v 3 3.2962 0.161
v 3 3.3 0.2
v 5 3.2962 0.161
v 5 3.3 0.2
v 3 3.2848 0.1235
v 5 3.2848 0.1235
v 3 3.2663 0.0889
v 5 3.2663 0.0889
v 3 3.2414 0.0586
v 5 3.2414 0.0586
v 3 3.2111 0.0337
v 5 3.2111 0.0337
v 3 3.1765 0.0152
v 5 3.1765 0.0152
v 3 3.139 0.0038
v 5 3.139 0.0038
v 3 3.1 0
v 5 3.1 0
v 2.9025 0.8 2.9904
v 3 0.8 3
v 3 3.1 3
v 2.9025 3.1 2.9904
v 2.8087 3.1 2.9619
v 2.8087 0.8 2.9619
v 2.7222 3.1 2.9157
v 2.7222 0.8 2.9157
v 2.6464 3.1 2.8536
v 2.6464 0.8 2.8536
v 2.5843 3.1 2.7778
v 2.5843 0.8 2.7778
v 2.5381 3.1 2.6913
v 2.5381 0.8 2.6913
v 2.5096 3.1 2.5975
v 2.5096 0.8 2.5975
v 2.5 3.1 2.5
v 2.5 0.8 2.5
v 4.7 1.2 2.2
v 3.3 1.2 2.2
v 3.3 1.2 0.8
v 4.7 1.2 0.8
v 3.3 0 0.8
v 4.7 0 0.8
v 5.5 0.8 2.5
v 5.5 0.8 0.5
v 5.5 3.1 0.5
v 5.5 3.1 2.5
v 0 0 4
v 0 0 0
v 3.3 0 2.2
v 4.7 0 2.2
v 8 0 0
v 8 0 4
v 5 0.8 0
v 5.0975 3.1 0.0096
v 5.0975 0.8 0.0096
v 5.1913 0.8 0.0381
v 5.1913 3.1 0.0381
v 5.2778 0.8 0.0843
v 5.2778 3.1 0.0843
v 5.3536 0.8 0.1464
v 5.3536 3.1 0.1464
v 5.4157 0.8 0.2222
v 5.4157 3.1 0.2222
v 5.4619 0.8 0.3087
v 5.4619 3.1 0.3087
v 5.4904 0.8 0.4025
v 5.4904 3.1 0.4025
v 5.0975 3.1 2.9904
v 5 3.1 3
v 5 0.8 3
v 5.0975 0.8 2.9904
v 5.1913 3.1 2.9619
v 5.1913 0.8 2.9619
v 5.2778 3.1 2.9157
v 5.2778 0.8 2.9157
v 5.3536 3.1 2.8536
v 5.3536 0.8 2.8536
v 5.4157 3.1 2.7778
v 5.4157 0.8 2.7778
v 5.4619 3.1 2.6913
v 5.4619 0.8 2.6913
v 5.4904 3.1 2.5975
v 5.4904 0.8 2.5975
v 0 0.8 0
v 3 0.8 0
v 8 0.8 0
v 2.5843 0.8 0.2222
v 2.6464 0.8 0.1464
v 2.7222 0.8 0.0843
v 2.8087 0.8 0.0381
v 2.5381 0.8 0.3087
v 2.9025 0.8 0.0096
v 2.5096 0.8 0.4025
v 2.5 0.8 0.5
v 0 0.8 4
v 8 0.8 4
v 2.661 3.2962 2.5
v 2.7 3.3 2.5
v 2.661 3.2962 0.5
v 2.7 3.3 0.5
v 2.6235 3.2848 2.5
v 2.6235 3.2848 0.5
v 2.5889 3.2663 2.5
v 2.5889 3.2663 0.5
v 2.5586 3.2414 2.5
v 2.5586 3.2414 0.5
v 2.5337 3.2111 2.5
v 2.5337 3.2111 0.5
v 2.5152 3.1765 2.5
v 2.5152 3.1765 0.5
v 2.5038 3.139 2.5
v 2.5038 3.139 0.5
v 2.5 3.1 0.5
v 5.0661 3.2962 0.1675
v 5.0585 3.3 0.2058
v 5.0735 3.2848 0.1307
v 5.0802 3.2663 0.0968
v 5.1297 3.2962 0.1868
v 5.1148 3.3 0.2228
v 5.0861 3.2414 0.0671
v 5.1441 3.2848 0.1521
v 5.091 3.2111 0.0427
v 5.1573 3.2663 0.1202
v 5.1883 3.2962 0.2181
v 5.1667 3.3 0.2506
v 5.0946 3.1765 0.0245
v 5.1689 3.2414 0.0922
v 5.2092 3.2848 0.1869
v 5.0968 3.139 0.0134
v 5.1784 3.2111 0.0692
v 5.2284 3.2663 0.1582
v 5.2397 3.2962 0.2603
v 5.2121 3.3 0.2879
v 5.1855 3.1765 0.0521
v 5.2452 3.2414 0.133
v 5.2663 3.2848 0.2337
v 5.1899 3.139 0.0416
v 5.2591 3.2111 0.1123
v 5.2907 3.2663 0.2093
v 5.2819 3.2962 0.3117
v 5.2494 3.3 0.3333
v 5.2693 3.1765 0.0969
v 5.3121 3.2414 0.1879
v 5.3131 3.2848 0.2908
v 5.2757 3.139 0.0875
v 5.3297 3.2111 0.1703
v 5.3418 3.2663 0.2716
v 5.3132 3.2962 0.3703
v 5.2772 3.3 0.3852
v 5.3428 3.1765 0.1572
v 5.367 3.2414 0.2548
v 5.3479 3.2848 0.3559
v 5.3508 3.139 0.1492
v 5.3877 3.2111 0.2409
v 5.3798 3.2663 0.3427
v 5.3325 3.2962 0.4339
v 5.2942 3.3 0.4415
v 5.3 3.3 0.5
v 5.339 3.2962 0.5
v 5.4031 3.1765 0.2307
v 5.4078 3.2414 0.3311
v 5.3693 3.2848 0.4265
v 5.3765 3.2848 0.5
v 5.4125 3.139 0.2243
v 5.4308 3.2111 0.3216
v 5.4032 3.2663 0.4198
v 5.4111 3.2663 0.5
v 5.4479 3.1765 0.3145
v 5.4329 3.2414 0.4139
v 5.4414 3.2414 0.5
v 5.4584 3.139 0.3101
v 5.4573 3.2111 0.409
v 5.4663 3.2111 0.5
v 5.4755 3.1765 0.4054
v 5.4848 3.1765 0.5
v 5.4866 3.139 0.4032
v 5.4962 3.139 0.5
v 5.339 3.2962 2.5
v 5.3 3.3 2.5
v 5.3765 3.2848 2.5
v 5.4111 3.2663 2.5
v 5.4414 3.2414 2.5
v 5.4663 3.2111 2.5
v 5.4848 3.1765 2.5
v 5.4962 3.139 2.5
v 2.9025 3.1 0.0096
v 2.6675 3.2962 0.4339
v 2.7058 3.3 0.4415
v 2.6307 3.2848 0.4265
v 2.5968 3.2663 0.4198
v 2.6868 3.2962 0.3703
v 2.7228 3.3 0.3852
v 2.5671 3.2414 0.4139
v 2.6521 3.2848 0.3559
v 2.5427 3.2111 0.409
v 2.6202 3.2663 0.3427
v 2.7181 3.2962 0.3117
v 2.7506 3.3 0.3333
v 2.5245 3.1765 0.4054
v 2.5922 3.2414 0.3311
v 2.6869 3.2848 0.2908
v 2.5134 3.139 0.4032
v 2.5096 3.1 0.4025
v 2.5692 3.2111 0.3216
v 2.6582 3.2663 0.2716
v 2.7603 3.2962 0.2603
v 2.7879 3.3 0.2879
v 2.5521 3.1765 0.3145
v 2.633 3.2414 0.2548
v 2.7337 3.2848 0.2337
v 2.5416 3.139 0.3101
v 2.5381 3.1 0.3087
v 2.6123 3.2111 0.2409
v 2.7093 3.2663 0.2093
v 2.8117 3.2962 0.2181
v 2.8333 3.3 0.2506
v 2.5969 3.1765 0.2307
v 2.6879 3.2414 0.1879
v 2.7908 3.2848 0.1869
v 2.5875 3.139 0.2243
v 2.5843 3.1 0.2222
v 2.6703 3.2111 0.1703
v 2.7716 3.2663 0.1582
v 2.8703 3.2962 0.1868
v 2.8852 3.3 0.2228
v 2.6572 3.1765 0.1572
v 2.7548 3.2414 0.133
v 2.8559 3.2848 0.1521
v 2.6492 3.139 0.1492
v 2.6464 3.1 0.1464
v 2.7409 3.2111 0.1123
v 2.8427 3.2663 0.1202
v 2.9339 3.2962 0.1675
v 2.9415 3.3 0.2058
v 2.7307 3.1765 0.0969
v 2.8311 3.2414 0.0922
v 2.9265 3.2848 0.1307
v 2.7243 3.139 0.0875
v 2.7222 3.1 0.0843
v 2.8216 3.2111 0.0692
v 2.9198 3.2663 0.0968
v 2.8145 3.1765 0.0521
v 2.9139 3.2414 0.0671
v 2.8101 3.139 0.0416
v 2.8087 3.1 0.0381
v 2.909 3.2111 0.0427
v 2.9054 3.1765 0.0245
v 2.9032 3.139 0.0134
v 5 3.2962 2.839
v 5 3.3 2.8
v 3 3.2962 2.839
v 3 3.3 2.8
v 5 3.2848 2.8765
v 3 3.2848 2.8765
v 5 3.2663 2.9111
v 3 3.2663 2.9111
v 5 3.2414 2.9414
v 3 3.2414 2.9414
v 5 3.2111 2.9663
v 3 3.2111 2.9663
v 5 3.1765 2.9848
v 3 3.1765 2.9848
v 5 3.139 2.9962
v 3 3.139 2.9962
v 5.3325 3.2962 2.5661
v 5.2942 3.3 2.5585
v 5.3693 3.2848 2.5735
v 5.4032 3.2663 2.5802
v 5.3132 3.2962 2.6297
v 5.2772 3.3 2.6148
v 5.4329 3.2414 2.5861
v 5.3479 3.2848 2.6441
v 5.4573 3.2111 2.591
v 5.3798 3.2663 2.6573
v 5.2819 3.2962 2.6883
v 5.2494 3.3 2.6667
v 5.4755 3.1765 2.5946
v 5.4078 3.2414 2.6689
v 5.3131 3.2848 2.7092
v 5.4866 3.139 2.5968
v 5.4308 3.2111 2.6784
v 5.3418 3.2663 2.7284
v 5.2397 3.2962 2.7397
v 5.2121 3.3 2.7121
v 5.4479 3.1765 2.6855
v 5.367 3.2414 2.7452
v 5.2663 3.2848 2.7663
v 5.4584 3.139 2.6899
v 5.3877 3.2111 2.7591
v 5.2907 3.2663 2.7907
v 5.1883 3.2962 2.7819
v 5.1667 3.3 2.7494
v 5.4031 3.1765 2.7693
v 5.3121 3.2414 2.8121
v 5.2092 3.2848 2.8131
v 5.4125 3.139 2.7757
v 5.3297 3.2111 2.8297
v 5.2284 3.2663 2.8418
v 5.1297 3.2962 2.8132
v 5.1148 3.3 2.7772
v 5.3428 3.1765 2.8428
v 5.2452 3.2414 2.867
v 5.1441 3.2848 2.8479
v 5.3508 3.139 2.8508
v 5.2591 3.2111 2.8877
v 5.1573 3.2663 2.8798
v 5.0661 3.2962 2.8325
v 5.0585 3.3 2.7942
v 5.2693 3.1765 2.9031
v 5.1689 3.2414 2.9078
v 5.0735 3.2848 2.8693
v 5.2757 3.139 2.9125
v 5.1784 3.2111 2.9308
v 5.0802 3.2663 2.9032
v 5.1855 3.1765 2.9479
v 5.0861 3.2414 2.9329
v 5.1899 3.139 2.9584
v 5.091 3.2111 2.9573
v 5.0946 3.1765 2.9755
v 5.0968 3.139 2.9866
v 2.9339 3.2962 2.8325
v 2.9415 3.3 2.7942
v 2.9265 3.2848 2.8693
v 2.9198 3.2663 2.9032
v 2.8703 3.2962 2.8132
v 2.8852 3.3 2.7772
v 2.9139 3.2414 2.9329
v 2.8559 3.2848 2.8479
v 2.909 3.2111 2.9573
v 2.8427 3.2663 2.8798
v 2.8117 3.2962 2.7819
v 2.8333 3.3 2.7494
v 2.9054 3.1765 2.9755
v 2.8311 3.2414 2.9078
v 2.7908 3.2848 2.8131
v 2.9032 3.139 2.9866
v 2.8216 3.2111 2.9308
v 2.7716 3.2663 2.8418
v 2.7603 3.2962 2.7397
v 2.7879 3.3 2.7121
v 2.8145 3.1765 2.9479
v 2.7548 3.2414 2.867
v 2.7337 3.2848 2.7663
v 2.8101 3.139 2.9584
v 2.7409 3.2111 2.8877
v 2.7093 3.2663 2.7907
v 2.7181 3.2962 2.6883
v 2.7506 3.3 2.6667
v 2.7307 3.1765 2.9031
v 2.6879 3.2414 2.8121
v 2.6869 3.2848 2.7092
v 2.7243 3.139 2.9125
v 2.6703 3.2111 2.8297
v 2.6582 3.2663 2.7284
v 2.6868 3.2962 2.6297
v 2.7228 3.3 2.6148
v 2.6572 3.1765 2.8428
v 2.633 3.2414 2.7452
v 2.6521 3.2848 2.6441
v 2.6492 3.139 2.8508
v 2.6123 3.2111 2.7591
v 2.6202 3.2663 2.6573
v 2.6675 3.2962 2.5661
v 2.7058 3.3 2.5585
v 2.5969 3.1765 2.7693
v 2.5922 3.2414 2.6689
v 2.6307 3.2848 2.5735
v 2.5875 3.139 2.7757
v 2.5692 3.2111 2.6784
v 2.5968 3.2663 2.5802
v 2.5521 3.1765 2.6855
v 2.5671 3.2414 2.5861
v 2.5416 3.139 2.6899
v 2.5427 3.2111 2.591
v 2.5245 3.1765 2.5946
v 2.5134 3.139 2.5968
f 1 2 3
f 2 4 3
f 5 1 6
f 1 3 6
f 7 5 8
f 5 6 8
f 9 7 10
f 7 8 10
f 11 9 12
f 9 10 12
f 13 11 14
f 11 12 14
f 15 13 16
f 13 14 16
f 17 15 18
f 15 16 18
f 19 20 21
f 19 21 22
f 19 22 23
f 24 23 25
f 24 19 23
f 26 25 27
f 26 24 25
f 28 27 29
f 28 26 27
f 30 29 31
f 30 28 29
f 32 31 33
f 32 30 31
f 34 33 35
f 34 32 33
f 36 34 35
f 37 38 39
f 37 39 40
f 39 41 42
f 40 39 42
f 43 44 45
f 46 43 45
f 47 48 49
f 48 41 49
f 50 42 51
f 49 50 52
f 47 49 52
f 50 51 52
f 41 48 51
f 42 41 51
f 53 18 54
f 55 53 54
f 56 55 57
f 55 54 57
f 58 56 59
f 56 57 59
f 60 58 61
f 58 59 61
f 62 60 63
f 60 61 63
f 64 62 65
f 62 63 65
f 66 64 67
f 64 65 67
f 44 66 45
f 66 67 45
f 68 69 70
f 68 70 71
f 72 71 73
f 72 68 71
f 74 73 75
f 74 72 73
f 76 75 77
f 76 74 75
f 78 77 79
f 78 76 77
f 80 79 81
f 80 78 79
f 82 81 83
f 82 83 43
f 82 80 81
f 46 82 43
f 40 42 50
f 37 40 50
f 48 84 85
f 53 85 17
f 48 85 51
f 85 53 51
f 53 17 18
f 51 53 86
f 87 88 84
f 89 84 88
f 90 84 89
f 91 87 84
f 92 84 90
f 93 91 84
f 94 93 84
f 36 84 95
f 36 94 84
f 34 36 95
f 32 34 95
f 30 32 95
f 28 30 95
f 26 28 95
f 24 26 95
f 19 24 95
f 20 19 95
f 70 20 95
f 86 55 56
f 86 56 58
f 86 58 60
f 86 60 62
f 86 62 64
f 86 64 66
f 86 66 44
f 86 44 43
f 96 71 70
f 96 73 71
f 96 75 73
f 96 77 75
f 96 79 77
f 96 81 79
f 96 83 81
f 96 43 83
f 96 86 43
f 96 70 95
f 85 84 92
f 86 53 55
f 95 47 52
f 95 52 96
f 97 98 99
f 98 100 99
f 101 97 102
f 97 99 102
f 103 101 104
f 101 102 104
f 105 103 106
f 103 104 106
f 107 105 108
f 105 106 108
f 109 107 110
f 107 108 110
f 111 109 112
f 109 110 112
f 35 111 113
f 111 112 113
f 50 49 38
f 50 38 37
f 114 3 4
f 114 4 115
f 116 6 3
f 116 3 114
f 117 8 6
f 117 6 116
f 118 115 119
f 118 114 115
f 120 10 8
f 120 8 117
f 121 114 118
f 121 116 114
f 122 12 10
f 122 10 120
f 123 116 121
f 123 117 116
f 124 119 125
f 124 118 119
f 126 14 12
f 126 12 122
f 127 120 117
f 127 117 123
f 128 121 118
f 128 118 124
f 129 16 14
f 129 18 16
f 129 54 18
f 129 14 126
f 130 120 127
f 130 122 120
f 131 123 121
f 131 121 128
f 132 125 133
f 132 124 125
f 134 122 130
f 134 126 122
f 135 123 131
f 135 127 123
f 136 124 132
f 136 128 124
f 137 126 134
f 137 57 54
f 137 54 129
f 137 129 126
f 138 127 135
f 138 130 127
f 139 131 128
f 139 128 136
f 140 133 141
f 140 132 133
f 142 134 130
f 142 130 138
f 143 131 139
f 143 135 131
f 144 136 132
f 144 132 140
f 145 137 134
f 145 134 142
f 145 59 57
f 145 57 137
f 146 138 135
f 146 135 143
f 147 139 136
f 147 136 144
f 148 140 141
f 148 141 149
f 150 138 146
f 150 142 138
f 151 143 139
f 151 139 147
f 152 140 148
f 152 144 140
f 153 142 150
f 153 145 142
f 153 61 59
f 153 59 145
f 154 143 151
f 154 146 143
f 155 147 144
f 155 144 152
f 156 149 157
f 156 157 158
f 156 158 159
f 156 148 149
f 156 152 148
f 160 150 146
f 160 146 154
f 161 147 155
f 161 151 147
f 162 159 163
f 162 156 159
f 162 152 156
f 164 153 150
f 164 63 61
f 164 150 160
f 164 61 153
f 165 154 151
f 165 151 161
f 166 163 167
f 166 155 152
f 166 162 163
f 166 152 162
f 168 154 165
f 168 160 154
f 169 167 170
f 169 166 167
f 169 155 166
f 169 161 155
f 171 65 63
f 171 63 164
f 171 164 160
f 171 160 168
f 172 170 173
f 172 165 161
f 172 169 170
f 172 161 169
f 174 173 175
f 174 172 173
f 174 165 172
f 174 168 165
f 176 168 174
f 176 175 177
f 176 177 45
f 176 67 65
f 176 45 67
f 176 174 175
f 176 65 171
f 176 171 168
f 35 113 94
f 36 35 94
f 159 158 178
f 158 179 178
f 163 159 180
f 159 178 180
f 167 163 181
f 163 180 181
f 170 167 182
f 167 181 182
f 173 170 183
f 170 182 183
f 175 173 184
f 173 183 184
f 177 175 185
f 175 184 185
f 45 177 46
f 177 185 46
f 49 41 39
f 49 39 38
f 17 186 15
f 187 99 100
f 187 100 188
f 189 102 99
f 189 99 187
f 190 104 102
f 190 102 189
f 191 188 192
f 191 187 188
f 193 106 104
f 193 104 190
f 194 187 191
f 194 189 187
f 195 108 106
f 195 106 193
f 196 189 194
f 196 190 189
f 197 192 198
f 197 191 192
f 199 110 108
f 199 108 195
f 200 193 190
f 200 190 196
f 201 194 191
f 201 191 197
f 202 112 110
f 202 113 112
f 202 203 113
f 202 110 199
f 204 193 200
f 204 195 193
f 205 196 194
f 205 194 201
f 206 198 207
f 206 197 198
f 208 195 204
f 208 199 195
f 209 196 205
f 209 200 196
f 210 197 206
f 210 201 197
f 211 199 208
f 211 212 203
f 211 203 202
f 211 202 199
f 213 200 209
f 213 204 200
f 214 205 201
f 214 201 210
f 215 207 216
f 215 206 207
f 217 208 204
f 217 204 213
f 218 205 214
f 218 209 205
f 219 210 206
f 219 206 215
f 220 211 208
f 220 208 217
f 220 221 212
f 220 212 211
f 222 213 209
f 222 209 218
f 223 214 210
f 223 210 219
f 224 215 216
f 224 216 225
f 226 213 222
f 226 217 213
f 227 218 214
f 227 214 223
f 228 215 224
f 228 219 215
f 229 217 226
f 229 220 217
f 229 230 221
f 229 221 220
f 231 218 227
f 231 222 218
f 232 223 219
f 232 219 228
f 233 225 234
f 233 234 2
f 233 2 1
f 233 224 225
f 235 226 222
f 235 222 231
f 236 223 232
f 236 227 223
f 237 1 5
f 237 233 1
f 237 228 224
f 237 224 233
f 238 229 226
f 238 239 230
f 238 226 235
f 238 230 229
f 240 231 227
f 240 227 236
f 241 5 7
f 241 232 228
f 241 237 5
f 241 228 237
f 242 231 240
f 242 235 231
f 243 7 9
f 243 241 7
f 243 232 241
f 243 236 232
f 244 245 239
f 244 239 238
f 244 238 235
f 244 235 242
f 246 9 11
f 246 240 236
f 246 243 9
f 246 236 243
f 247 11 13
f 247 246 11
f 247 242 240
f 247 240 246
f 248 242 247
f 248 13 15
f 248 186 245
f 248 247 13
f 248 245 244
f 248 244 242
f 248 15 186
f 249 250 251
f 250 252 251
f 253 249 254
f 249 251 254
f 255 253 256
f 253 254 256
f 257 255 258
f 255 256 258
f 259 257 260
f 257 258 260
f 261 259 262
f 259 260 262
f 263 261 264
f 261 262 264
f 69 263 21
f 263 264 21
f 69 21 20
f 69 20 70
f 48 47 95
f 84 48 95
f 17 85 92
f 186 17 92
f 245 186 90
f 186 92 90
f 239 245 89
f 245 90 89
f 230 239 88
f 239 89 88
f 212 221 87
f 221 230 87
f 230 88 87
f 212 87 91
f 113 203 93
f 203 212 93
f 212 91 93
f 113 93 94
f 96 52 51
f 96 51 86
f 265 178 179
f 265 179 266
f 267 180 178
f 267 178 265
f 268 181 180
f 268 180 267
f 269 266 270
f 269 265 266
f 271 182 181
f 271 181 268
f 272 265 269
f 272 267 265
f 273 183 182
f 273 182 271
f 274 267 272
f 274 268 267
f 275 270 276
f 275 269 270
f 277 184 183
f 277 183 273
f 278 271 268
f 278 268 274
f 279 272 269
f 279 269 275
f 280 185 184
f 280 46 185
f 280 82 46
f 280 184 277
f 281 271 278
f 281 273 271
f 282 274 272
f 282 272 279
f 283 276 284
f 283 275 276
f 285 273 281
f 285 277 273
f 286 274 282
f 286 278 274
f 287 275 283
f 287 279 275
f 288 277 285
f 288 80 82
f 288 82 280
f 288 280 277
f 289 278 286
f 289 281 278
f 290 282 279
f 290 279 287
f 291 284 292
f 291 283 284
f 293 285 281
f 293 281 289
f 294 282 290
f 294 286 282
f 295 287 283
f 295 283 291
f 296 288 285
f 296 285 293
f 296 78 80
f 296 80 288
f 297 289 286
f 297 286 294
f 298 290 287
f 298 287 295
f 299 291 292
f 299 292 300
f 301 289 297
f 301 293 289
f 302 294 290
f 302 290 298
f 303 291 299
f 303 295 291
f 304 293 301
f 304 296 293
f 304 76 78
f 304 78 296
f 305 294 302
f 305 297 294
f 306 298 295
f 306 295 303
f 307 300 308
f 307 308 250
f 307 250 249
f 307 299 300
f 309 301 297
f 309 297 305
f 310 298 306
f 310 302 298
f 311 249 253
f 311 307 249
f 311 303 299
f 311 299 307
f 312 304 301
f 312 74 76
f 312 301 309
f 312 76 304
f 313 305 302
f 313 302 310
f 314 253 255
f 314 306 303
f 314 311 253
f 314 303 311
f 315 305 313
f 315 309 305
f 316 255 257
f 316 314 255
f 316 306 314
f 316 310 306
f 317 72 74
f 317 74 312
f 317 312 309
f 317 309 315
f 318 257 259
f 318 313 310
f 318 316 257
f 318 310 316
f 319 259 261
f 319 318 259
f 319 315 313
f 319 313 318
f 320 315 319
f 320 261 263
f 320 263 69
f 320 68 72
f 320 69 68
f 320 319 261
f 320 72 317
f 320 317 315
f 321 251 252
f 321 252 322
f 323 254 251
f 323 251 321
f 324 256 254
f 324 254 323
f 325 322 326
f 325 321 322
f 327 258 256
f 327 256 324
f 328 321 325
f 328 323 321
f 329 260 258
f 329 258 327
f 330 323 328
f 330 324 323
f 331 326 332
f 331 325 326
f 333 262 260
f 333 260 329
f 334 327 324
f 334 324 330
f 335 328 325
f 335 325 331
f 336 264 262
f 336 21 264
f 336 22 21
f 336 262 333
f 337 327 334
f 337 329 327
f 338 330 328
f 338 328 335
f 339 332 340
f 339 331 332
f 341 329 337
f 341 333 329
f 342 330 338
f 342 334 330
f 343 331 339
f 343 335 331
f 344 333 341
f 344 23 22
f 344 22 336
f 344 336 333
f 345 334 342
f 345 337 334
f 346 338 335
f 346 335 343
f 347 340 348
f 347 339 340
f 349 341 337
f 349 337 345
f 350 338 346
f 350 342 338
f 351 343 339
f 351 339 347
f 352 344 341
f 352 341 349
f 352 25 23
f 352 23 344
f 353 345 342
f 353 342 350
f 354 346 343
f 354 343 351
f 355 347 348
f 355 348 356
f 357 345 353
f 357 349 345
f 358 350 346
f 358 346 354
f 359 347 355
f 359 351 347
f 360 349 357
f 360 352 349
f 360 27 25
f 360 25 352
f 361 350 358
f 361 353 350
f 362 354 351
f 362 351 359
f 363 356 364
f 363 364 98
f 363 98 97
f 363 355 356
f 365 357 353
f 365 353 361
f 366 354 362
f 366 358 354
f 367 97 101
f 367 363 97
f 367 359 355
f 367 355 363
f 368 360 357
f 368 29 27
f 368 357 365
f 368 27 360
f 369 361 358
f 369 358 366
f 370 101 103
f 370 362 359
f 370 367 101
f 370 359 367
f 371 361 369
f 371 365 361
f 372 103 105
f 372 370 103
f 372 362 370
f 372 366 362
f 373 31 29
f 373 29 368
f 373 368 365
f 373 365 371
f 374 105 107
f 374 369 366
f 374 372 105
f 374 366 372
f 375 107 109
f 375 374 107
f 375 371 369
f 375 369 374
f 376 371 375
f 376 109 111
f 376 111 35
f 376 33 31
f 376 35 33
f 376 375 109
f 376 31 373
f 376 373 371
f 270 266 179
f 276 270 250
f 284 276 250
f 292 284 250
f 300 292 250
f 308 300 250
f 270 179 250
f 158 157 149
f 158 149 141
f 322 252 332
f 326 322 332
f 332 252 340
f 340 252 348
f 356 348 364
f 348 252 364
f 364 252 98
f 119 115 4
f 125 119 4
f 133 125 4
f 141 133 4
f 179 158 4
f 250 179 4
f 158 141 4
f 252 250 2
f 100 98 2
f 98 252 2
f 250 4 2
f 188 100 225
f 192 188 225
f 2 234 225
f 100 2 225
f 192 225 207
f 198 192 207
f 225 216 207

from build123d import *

# Parameters (mm, degrees)
F1_DEPTH = 3
F2_W     = 1.4
F2_H     = 1.4
F3_DEPTH = 1.2
F4_R     = 0.5
F5_R     = 0.2
F6_W     = 0.8
F6_H     = 1
F7_DEPTH = 8


with BuildPart() as f1:
    # F0 (on Top) → F1 (new body)
    with BuildSketch(Plane.XY):
        Polygon((0, 0.8), (0, 0), (8, 0), (8, 0.8), (5.5, 0.8), (5.5, 3.3), (2.5, 3.3), (2.5, 0.8), align=None)
    extrude(amount=F1_DEPTH)

    # F2 (on face) → F3 (cut)
    with BuildSketch(Plane.XZ):
        with Locations((4, 1.5)):
            Rectangle(F2_W, F2_H)
    extrude(amount=-F3_DEPTH, mode=Mode.SUBTRACT)

    # F4
    f4_edges = [f1.edges().sort_by_distance(p)[0] for p in [
        (5.5, 2.05, 3),
        (2.5, 2.05, 3),
        (2.5, 2.05, 0),
        (5.5, 2.05, 0),
    ]]
    fillet(f4_edges, radius=F4_R)

    # F5
    f5_edges = [f1.edges().sort_by_distance(p)[0] for p in [
        (4, 3.3, 3),
        (5.353553, 3.3, 2.853553),
        (5.5, 3.3, 1.5),
        (5.353553, 3.3, 0.146447),
        (4, 3.3, 0),
        (2.646447, 3.3, 0.146447),
        (2.5, 3.3, 1.5),
        (2.646447, 3.3, 2.853553),
    ]]
    fillet(f5_edges, radius=F5_R)

    # F6 (on face) → F7 (join, through all)
    with BuildSketch(Plane.YZ.offset(8)):
        with Locations((0.4, 3.5)):
            Rectangle(F6_W, F6_H)
    extrude(amount=-F7_DEPTH)


solid = f1.part
